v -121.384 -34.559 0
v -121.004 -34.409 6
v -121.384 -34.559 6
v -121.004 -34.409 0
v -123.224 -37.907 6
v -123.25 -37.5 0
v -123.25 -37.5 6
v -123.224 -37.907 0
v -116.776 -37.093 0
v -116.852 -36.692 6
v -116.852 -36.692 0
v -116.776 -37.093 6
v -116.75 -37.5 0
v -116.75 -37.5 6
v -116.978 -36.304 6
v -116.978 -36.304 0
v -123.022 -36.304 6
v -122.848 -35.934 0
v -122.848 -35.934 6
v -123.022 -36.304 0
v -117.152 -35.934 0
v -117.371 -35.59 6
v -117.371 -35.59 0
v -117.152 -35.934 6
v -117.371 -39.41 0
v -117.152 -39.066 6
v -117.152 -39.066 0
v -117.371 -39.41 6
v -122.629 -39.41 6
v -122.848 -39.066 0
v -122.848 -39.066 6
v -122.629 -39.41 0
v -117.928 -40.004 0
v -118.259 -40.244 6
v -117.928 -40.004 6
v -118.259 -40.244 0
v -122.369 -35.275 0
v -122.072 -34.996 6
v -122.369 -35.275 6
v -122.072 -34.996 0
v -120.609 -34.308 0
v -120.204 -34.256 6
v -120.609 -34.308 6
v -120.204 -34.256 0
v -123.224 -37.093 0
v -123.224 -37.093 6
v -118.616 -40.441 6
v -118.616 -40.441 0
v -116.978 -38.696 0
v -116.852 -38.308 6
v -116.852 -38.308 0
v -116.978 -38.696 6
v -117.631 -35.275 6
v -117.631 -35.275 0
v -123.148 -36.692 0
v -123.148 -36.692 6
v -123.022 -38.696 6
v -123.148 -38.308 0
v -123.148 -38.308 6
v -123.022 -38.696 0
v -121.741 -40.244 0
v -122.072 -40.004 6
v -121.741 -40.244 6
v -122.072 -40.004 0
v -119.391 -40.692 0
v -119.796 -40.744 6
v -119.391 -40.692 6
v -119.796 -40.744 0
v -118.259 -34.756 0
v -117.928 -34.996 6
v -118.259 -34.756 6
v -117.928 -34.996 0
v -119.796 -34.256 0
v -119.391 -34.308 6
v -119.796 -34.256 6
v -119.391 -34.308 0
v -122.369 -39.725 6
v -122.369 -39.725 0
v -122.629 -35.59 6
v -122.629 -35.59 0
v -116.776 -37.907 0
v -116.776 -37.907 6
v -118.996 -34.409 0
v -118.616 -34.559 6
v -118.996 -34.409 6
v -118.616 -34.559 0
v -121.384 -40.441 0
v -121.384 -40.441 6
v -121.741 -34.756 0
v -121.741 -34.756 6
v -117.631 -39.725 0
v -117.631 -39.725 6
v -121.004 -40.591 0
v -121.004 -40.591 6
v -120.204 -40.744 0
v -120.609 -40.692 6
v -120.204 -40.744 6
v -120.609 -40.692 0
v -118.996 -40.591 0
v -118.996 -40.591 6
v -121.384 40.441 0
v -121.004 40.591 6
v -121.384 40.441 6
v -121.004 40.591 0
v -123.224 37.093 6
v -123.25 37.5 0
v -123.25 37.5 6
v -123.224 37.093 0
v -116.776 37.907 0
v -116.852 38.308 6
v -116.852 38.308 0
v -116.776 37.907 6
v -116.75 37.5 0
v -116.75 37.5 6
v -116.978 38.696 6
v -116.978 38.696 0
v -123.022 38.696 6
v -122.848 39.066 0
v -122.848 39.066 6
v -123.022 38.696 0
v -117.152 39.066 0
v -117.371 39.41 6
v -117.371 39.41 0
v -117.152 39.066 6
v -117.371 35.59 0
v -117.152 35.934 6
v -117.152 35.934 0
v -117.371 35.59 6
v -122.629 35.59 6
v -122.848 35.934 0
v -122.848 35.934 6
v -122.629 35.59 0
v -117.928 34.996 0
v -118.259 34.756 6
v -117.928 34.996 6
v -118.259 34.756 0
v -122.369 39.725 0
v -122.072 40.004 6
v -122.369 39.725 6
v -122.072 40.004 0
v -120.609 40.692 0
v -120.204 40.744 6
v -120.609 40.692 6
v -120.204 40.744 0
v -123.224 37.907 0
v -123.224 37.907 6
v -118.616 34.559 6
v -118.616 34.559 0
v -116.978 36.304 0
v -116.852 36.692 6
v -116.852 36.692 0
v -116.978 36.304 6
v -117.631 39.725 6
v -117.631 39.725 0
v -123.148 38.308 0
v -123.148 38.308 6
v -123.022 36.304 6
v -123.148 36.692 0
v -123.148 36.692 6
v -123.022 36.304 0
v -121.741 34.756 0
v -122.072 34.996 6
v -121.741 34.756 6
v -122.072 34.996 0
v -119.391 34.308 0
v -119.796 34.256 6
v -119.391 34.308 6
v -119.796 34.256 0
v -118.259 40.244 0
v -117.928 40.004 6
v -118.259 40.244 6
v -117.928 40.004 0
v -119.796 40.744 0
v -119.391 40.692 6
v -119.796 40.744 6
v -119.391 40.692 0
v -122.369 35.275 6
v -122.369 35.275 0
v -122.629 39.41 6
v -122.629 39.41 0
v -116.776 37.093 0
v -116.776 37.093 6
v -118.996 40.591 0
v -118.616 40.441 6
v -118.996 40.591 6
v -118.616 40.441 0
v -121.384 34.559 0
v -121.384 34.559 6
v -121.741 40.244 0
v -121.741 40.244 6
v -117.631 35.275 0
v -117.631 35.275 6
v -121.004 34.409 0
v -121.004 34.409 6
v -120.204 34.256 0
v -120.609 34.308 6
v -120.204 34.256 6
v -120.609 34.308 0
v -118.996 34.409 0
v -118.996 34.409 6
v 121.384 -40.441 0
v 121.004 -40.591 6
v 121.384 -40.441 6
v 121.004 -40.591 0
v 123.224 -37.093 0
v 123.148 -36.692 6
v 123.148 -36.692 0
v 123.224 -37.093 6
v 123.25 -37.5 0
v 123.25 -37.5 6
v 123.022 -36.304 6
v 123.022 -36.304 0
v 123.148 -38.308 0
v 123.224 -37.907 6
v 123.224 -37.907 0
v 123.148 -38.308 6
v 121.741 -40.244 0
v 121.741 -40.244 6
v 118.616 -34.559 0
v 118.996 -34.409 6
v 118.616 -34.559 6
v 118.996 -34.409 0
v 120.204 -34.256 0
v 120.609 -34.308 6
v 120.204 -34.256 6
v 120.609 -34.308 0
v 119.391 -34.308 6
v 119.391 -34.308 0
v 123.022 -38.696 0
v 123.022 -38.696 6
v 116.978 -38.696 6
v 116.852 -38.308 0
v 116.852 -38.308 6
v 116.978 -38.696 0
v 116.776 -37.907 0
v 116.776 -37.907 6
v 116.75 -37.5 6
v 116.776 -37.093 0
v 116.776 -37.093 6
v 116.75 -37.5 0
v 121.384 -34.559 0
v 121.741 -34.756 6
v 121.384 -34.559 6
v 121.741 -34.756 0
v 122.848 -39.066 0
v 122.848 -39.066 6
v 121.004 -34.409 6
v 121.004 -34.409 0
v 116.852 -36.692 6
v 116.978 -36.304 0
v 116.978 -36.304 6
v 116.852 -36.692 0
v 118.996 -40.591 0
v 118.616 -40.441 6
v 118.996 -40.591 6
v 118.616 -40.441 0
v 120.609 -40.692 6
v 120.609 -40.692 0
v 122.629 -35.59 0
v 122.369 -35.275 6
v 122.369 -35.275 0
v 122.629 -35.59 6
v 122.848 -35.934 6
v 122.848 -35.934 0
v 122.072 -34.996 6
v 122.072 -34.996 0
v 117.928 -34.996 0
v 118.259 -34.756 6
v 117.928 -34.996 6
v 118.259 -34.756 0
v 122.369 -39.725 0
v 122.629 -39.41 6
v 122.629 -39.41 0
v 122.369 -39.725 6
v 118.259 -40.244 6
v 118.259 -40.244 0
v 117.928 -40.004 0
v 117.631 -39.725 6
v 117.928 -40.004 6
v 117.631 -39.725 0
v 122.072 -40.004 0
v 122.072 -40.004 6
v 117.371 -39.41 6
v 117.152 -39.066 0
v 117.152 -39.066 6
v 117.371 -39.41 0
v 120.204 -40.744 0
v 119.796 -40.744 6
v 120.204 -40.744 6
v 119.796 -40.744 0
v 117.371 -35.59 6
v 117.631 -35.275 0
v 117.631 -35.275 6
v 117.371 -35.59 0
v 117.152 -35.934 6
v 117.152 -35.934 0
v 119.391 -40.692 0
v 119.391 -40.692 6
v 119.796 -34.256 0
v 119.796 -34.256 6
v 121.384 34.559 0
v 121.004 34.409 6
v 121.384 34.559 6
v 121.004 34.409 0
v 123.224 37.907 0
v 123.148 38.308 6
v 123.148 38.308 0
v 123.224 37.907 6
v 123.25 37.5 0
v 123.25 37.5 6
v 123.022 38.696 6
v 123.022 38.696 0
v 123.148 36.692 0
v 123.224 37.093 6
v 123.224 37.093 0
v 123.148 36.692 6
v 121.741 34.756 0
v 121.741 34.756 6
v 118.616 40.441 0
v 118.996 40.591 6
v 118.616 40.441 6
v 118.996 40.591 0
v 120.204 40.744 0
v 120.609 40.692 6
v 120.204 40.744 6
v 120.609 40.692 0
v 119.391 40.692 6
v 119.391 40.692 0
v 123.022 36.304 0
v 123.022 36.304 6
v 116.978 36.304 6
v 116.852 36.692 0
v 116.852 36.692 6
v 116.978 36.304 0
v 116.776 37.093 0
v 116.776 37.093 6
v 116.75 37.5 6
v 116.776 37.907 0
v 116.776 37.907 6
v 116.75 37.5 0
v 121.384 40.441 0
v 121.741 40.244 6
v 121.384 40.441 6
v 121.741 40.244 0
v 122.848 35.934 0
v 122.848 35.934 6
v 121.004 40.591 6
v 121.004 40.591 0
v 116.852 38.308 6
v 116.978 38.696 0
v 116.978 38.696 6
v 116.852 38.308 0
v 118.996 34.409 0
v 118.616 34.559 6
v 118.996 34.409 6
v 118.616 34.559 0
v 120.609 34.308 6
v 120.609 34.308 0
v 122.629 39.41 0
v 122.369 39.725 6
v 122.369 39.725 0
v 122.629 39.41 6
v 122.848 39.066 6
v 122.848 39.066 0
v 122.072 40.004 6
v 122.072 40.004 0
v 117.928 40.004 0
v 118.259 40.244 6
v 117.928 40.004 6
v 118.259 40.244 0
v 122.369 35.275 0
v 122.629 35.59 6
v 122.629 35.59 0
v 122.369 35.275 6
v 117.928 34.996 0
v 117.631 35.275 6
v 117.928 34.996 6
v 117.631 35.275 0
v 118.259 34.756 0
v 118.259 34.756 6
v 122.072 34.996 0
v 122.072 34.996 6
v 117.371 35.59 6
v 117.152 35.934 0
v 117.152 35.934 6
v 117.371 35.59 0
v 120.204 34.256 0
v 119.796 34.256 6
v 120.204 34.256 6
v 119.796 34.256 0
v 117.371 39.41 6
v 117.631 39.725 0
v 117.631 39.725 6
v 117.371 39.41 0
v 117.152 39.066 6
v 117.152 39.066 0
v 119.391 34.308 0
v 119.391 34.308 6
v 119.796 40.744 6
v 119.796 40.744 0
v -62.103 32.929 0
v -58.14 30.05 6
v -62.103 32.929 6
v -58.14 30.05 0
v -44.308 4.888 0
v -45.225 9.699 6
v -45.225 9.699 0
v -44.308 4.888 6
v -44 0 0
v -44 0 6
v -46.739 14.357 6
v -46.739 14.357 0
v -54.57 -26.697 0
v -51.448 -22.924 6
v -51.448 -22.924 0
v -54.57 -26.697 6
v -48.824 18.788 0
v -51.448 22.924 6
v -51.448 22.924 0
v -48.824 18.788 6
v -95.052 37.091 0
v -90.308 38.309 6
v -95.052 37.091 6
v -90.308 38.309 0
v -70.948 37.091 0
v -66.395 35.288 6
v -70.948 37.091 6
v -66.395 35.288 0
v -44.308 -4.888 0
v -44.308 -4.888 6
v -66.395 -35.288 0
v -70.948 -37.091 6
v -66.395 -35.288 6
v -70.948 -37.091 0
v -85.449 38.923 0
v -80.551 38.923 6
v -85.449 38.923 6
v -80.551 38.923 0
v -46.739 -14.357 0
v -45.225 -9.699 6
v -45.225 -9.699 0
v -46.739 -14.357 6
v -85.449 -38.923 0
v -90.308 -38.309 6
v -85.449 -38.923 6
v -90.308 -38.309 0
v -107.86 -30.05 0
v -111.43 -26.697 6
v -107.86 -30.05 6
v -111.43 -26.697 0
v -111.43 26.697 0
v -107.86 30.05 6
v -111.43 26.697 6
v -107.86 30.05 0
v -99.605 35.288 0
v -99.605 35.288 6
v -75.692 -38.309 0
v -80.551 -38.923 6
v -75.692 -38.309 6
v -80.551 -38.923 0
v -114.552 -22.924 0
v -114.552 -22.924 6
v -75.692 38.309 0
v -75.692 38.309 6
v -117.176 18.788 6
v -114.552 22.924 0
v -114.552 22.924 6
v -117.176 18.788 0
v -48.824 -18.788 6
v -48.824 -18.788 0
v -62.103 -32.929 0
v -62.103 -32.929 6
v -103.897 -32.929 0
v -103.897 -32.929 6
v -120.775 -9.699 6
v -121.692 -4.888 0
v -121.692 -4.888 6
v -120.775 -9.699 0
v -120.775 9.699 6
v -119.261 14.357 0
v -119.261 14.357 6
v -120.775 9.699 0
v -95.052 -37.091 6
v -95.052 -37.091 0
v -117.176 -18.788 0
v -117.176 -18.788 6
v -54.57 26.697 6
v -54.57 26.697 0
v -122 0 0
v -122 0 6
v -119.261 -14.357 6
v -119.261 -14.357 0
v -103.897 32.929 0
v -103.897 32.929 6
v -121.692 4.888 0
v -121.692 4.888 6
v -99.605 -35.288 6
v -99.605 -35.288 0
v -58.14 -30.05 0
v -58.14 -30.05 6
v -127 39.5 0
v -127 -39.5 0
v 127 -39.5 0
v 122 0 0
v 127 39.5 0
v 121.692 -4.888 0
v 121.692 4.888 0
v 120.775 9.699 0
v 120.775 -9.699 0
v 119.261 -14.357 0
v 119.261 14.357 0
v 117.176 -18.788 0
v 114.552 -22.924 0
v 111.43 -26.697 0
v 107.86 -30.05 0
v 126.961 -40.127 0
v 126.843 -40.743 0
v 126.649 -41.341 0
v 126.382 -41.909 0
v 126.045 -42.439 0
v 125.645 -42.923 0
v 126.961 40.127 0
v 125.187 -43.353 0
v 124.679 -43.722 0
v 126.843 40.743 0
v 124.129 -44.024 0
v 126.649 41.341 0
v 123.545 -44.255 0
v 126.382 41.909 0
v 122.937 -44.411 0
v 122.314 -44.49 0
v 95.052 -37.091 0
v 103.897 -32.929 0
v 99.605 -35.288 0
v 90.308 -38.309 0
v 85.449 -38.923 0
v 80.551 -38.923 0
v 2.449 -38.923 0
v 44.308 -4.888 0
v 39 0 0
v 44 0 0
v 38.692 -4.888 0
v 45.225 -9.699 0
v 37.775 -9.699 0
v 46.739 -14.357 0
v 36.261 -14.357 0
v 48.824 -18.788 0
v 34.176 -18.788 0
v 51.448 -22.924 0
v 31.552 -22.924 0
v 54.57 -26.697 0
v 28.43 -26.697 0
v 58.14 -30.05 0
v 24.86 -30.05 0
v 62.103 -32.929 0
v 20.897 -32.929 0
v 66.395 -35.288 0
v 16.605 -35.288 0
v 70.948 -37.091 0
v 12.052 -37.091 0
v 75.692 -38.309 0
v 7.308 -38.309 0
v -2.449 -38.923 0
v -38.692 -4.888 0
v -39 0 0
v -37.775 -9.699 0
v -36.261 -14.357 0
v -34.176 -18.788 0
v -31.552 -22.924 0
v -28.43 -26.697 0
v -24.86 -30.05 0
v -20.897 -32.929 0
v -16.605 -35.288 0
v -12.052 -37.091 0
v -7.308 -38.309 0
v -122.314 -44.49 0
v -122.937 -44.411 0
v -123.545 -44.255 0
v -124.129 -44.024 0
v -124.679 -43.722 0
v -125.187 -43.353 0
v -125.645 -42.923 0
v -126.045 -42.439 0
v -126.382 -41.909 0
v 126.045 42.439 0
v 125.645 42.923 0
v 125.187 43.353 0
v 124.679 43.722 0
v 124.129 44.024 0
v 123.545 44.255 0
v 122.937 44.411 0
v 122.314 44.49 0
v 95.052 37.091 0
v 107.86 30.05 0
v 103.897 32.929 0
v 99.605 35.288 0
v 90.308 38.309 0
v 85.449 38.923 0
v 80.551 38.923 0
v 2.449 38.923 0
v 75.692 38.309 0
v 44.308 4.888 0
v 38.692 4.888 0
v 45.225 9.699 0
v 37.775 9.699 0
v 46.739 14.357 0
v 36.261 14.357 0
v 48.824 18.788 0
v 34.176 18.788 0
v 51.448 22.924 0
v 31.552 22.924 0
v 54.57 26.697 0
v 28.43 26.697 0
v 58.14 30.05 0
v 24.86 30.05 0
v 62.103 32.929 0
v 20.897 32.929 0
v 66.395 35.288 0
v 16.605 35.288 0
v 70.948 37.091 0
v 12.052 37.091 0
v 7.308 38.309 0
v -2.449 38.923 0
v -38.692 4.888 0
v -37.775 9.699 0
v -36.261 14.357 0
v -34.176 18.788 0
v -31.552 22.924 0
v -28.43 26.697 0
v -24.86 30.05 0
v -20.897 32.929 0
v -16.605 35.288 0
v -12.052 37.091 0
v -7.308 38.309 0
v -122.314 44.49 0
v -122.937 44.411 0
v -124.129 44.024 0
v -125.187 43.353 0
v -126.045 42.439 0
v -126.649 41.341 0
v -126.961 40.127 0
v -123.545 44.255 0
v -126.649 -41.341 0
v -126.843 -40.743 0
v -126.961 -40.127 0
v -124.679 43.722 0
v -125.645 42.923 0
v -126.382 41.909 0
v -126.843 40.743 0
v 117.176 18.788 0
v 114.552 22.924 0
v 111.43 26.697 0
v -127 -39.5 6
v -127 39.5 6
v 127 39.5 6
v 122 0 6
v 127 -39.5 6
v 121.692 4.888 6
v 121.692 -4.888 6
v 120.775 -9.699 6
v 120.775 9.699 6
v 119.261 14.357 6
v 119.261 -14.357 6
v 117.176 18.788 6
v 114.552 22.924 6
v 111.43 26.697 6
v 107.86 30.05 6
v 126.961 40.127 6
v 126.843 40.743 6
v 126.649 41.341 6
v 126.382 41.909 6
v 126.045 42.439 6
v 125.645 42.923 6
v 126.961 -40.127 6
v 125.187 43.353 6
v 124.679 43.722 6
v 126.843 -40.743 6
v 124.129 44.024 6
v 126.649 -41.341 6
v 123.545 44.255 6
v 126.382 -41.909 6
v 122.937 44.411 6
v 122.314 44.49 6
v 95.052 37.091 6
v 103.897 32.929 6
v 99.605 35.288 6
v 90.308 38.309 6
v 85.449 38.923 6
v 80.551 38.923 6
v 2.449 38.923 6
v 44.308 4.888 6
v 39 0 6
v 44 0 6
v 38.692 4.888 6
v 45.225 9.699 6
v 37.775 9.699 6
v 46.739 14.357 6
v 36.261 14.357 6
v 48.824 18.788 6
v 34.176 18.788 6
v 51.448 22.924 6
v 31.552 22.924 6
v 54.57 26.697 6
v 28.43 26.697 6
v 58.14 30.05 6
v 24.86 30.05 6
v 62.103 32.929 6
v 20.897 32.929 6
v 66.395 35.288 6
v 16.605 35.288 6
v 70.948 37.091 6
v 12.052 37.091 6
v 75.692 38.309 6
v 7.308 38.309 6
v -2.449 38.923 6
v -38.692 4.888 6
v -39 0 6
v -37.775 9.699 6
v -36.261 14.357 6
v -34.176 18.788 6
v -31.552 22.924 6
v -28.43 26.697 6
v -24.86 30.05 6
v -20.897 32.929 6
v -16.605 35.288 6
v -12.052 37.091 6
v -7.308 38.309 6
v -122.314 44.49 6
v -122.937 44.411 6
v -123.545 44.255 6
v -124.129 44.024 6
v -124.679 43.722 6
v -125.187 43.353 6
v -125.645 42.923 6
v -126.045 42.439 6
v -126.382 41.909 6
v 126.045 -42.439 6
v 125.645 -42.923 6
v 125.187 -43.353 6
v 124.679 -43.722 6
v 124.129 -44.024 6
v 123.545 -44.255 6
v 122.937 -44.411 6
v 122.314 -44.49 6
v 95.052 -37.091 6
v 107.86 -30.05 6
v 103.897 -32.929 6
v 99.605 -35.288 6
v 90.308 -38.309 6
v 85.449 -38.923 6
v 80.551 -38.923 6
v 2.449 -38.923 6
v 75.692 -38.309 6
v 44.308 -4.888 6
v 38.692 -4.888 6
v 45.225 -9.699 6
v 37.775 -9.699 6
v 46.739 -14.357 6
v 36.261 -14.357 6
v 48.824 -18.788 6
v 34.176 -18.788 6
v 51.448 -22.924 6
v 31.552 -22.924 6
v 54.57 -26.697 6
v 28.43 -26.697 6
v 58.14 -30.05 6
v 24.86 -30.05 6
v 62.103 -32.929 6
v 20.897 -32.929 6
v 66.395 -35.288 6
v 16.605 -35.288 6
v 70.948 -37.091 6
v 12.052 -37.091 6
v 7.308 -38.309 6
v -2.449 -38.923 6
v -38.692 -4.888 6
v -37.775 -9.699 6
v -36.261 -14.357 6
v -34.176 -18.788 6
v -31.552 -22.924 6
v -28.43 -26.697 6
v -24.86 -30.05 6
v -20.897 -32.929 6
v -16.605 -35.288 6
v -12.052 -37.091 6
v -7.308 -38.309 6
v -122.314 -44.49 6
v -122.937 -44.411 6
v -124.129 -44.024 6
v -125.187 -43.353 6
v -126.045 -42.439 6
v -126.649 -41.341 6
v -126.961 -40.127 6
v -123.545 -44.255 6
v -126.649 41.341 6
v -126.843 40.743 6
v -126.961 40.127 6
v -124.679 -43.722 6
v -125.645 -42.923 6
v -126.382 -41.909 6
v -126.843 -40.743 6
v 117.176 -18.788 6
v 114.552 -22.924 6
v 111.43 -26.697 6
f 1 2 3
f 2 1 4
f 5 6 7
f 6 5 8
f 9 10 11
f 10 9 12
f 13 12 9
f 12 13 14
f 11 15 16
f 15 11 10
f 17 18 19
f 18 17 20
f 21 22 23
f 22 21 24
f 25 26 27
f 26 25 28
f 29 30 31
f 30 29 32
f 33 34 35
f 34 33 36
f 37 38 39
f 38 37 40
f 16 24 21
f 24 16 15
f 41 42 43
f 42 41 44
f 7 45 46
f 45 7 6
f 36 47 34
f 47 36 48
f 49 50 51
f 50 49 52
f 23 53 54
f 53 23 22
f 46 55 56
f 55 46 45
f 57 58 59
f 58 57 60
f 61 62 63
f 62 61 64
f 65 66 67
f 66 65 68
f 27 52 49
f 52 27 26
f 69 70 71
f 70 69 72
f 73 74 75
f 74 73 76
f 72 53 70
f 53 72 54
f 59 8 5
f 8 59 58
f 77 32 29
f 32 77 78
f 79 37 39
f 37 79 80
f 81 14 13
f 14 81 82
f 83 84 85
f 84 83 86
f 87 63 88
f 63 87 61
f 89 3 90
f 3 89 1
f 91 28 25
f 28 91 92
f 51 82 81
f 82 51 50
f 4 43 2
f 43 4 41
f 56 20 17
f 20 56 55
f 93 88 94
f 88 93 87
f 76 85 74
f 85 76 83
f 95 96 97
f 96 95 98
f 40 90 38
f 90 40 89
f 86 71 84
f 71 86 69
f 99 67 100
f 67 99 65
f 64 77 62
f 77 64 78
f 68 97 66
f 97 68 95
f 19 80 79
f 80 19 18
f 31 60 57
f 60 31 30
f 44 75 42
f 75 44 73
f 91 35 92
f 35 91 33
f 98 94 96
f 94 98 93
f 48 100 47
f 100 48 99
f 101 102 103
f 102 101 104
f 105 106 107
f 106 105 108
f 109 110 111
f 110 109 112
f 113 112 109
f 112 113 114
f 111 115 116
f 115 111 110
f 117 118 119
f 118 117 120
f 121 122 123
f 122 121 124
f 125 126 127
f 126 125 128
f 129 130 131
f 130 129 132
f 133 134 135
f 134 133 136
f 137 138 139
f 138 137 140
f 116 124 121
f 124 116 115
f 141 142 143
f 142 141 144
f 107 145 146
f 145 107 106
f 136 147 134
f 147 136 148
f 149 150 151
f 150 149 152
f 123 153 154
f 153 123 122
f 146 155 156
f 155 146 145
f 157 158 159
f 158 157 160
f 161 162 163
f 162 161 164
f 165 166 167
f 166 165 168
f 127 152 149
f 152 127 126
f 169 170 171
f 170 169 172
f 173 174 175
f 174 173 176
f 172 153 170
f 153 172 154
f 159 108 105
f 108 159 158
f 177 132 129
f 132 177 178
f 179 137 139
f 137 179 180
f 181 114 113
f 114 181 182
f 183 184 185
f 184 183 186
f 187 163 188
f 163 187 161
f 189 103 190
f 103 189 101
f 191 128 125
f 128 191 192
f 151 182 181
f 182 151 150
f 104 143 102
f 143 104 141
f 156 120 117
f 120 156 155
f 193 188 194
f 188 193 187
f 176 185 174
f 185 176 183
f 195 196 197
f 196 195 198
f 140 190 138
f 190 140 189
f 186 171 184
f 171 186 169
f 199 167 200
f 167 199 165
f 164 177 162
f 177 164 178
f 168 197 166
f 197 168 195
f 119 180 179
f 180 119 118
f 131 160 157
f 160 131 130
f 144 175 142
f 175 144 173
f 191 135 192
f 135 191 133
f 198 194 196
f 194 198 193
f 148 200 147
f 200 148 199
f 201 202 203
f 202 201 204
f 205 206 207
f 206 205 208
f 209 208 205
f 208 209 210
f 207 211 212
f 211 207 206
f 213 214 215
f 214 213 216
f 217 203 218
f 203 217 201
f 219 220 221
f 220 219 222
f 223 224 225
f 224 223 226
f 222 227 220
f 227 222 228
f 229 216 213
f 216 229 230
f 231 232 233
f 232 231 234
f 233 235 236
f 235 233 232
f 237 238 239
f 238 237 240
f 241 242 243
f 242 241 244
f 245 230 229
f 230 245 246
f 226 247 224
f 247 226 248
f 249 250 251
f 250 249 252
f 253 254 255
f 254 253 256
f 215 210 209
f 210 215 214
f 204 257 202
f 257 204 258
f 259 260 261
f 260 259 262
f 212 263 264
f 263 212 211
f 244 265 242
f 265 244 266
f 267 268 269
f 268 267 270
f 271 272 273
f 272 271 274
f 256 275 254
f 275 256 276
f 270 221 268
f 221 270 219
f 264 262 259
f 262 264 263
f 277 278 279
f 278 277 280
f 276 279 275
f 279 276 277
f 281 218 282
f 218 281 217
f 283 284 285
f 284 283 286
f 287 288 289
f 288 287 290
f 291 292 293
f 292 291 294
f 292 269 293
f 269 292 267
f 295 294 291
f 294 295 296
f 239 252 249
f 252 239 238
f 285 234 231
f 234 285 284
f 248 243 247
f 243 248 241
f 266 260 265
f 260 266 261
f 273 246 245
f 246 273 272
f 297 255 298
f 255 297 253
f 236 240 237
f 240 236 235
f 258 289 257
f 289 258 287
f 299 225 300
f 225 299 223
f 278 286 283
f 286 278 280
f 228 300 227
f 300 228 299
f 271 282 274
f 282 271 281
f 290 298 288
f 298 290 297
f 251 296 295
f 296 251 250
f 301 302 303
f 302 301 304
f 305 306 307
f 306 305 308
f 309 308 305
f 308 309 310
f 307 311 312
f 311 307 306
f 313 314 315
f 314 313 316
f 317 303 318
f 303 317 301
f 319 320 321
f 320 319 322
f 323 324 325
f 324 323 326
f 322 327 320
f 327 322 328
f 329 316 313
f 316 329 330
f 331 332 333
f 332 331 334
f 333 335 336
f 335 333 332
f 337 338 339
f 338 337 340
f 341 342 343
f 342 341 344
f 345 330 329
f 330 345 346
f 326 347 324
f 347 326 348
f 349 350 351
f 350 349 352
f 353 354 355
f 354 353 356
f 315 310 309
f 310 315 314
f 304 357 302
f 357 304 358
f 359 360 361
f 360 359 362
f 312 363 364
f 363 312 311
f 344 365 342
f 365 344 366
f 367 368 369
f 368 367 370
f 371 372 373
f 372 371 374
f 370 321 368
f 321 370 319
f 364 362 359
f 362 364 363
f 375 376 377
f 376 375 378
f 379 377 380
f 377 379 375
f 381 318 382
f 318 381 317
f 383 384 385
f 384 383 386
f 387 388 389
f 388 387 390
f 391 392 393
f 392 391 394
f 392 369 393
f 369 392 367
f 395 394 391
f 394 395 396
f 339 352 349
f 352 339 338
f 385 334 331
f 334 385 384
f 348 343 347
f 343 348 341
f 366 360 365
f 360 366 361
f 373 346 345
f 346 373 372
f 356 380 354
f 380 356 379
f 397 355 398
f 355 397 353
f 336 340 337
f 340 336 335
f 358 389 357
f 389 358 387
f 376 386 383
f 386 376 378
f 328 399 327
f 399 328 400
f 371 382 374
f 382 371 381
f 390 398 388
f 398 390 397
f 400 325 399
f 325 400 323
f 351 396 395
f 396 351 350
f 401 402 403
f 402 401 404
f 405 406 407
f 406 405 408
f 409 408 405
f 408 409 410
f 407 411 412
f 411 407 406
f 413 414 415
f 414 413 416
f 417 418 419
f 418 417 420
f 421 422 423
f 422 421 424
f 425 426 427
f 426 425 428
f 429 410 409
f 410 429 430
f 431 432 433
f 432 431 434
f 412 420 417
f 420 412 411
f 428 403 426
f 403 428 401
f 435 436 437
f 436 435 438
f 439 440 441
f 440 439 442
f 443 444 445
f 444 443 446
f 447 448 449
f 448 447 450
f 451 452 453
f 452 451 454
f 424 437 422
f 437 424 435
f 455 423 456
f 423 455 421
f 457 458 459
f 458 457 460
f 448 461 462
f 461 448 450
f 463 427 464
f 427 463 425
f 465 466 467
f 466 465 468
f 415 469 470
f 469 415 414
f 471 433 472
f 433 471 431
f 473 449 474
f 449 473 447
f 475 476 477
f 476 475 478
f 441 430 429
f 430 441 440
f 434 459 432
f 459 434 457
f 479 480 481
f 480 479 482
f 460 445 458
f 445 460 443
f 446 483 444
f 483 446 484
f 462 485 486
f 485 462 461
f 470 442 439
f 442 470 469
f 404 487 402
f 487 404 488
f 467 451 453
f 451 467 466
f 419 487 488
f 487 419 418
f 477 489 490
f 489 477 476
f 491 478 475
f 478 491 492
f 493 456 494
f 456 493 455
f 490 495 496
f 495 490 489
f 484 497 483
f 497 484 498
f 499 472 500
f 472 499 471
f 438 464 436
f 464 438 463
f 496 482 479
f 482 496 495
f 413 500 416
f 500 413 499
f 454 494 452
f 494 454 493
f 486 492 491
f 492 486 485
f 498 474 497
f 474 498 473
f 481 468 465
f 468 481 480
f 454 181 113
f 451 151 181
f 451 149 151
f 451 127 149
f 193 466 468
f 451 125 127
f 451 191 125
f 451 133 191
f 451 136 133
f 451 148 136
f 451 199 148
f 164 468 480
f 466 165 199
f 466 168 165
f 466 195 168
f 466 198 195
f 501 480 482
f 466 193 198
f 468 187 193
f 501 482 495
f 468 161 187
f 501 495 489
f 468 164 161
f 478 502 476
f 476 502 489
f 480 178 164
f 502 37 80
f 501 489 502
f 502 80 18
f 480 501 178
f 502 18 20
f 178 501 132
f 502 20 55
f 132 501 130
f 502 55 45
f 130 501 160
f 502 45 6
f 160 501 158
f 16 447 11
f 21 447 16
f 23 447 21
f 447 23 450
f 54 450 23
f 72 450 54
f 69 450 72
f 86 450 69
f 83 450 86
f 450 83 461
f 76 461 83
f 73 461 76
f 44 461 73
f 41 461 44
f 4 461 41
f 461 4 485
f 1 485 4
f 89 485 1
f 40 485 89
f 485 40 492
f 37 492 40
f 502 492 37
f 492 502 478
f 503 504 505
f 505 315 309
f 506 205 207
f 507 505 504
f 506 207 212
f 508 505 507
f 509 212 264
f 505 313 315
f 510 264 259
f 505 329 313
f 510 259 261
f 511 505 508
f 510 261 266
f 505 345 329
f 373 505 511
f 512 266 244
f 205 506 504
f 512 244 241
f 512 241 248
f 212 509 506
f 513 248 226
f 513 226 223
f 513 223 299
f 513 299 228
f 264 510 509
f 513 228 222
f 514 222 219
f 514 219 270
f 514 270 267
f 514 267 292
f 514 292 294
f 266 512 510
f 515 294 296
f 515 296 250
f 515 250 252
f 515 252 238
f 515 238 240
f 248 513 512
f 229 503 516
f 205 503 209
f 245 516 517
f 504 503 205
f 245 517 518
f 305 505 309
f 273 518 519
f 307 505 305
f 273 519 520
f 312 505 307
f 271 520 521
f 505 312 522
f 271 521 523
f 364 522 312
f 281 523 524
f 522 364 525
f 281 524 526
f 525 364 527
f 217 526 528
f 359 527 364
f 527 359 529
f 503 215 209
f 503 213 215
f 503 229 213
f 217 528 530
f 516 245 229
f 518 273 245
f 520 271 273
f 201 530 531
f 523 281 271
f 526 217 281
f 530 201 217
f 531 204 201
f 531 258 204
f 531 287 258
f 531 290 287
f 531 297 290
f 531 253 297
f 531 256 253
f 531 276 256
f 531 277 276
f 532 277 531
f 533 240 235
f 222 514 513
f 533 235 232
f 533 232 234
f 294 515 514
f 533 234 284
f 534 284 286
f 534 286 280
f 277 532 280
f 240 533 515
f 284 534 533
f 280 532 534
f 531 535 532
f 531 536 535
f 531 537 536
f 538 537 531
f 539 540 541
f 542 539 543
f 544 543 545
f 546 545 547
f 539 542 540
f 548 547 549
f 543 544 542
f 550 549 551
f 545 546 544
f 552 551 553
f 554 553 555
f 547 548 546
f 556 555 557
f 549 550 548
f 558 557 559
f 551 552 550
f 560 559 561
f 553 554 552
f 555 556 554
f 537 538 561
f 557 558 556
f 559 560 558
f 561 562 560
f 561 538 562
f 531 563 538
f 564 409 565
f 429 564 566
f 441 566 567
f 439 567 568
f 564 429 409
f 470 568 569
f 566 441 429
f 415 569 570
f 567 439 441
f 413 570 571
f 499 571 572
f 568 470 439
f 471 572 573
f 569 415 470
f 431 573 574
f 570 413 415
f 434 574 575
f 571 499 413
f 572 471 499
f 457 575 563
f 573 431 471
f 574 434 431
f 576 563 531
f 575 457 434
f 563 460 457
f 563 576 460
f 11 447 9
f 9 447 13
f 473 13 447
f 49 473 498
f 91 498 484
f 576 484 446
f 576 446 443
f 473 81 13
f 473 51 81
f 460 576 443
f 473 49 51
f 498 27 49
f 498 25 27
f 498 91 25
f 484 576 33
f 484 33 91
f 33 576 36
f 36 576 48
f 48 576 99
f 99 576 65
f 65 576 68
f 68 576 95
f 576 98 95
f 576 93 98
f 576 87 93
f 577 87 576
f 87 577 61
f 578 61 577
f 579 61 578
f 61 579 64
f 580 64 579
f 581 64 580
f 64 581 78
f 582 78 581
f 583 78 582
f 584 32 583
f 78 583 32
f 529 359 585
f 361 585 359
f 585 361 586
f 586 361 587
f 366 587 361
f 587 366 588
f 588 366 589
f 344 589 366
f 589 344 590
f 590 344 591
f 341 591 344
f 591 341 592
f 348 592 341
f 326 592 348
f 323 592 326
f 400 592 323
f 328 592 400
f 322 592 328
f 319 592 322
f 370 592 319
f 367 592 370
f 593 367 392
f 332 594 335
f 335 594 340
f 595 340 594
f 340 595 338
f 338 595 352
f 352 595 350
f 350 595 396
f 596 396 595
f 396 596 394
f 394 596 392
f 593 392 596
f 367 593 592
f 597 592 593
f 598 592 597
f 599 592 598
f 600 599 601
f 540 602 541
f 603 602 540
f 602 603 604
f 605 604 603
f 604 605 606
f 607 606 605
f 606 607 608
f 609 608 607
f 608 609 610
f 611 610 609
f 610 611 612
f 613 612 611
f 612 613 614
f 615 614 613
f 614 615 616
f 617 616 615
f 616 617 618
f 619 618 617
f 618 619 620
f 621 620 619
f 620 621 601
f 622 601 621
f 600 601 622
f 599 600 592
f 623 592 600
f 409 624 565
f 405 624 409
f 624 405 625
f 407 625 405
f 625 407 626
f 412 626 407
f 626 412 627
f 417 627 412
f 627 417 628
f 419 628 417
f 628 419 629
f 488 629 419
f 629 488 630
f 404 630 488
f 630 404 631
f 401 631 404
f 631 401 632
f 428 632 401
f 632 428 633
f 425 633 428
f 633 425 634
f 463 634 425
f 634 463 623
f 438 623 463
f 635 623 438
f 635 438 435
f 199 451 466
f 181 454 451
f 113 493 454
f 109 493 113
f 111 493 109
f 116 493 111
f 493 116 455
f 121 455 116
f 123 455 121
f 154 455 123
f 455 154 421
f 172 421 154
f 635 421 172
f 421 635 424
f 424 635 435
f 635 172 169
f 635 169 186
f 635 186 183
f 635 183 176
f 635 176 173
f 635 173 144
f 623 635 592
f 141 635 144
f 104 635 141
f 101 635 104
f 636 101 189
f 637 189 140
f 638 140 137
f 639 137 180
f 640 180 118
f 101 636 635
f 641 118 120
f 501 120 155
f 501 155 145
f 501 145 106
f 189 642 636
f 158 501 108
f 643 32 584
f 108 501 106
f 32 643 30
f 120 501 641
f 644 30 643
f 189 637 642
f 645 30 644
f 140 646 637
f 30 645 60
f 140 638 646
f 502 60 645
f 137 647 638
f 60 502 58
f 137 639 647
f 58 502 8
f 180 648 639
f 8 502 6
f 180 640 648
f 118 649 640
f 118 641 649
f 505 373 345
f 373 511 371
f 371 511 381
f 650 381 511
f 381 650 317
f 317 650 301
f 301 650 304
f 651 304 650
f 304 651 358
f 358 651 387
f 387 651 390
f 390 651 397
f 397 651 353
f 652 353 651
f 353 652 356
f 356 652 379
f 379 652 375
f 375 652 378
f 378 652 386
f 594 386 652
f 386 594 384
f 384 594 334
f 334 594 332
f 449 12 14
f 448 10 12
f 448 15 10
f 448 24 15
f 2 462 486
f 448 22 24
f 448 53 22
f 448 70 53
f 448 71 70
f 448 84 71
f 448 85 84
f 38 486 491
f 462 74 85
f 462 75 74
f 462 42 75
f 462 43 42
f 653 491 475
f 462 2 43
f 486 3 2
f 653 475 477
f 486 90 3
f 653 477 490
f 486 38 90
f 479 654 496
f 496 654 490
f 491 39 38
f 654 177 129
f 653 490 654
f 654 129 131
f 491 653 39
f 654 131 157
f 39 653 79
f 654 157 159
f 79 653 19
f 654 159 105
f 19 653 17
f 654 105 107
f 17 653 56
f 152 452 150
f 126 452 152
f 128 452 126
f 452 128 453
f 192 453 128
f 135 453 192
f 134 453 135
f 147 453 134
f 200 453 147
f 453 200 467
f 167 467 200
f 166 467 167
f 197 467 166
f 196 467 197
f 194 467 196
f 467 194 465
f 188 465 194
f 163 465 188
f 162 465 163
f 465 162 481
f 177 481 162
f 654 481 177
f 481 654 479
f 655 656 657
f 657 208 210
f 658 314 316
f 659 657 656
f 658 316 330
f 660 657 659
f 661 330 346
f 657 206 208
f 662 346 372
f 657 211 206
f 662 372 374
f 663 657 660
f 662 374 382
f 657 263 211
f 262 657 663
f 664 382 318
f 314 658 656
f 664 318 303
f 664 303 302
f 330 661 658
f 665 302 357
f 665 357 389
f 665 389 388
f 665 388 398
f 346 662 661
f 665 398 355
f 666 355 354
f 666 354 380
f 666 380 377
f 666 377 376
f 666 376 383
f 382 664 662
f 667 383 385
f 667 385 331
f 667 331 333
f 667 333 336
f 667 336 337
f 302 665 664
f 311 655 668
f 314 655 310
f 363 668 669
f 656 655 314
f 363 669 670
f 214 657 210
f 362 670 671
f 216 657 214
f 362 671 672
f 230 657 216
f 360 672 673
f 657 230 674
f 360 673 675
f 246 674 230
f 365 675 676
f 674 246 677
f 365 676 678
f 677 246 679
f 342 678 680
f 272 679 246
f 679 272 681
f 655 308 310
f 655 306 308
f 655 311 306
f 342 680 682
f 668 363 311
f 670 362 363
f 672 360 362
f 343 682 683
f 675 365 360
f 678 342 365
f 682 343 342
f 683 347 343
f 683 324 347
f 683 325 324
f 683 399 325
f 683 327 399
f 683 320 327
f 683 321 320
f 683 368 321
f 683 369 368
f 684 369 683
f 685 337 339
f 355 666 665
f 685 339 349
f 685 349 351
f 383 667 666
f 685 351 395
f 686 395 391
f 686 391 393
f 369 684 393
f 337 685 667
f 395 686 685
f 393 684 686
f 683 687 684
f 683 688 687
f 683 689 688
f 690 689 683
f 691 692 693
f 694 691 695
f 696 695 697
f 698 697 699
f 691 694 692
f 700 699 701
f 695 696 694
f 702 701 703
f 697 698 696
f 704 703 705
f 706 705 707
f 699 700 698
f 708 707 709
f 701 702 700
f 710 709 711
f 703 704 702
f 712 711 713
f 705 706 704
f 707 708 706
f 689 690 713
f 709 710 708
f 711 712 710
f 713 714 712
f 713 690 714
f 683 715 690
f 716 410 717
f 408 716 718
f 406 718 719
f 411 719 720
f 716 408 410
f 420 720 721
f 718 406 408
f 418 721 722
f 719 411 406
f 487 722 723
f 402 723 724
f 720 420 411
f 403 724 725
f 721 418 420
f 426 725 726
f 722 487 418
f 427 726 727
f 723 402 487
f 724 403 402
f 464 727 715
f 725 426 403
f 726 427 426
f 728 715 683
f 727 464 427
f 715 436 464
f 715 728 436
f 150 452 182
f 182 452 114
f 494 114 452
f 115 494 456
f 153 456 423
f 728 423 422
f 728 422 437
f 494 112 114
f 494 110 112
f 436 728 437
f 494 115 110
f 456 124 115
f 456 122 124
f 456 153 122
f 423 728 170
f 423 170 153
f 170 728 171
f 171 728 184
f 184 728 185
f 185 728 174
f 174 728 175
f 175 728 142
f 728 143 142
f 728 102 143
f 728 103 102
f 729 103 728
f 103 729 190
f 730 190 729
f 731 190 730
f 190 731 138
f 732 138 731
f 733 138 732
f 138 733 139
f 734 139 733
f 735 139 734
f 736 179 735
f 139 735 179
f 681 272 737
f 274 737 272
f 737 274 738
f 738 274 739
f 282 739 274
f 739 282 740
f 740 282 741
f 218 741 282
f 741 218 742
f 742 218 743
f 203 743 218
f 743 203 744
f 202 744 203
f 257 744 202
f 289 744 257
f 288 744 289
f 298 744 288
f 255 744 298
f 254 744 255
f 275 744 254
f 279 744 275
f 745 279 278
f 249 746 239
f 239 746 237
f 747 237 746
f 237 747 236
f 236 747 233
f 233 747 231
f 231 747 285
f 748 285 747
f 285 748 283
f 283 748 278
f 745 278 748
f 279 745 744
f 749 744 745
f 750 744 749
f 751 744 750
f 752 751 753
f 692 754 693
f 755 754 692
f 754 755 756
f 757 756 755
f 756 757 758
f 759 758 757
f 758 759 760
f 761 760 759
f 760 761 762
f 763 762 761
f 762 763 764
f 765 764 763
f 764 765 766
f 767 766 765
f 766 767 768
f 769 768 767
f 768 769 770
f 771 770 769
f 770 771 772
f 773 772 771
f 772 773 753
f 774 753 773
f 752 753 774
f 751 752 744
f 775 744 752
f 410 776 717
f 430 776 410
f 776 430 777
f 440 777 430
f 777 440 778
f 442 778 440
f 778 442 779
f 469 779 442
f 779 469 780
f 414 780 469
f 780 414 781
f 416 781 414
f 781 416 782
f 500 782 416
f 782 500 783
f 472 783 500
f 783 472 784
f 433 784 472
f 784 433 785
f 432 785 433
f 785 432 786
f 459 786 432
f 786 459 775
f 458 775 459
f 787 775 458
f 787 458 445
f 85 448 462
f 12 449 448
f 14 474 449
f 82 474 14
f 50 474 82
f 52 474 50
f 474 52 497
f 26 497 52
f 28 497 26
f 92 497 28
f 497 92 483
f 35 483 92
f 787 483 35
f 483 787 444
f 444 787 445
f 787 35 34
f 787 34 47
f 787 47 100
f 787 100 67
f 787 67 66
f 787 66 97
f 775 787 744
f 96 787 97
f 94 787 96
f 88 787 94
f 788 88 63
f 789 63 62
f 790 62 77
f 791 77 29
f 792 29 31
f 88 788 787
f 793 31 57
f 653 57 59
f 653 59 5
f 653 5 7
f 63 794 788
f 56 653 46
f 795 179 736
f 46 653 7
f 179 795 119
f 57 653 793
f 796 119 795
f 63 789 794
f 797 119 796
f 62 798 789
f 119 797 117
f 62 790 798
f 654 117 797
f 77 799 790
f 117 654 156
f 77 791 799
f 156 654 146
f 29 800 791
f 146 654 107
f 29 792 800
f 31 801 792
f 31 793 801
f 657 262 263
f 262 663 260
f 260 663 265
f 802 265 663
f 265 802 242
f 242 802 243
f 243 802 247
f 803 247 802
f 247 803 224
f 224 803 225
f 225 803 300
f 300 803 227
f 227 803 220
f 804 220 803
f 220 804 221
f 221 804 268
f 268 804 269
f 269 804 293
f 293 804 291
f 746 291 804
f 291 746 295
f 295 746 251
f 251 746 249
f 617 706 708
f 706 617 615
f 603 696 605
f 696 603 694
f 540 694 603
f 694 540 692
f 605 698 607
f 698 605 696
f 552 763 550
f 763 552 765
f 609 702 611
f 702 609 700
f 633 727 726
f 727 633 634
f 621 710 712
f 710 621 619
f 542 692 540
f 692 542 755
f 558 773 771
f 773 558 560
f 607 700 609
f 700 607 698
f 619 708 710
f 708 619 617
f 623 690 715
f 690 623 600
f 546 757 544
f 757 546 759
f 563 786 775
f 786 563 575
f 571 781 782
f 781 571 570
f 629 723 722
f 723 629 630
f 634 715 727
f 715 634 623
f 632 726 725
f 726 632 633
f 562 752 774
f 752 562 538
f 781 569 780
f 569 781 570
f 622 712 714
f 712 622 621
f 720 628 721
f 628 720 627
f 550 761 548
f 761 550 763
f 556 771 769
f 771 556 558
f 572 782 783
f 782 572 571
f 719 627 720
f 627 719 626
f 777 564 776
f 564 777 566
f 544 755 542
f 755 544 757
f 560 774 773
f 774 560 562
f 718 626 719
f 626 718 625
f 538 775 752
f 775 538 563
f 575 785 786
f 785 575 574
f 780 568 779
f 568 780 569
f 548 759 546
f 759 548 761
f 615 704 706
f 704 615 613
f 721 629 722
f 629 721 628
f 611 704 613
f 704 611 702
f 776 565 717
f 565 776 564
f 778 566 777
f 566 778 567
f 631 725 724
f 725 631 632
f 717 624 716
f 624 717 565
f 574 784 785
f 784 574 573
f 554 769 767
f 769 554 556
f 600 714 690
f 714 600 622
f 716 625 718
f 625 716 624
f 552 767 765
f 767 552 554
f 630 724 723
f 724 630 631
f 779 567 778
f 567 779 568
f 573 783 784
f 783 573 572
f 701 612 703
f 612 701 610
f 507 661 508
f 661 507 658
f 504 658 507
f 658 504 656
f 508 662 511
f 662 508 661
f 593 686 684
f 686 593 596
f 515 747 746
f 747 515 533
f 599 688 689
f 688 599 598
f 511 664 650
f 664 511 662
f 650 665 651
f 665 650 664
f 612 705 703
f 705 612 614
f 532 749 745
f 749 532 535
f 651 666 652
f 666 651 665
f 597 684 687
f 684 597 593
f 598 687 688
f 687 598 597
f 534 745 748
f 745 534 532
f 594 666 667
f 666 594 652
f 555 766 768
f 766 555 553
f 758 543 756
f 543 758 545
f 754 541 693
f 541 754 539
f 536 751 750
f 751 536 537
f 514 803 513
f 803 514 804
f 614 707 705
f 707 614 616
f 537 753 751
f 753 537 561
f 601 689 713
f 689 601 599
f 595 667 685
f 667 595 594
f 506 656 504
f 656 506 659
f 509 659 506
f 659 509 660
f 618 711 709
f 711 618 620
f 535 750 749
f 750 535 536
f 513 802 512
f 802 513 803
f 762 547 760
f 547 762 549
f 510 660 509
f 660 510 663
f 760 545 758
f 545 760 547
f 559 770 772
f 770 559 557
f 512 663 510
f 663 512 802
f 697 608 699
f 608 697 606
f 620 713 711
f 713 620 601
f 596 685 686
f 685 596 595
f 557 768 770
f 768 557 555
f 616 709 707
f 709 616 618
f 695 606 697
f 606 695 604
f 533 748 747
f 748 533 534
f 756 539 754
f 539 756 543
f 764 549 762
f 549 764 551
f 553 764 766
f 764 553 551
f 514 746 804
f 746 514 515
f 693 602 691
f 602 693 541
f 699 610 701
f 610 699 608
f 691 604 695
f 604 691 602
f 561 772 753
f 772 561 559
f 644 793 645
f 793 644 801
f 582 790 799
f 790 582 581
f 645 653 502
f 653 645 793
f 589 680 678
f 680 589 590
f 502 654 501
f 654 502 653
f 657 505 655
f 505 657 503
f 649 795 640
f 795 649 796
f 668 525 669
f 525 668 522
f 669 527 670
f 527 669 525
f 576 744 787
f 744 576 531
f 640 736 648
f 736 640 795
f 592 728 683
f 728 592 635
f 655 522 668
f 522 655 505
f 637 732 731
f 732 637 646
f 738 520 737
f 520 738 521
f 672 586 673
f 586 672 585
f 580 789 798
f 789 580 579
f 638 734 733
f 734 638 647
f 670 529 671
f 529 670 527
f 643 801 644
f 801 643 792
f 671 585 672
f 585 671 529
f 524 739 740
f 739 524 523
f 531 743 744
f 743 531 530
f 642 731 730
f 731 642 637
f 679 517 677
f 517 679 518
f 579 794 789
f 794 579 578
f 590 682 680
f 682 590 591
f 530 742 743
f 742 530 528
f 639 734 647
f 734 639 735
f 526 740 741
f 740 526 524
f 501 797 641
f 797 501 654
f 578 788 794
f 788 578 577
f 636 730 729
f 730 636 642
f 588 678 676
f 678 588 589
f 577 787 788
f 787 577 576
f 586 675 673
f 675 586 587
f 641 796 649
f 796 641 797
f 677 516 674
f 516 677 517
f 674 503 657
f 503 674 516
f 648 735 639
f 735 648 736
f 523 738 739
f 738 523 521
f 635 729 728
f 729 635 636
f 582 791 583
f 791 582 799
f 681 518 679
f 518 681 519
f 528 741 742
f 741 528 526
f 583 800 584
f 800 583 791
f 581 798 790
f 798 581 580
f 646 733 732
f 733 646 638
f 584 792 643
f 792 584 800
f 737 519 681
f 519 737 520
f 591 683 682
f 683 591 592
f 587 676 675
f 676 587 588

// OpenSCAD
$fn = 50;


difference() {
	union() {
		hull() {
			translate(v = [-122.0000000000, 39.5000000000, 0]) {
				cylinder(h = 6, r = 5);
			}
			translate(v = [122.0000000000, 39.5000000000, 0]) {
				cylinder(h = 6, r = 5);
			}
			translate(v = [-122.0000000000, -39.5000000000, 0]) {
				cylinder(h = 6, r = 5);
			}
			translate(v = [122.0000000000, -39.5000000000, 0]) {
				cylinder(h = 6, r = 5);
			}
		}
	}
	union() {
		#translate(v = [-120.0000000000, -37.5000000000, -100.0000000000]) {
			cylinder(h = 200, r = 3.2500000000);
		}
		#translate(v = [-120.0000000000, 37.5000000000, -100.0000000000]) {
			cylinder(h = 200, r = 3.2500000000);
		}
		#translate(v = [120.0000000000, -37.5000000000, -100.0000000000]) {
			cylinder(h = 200, r = 3.2500000000);
		}
		#translate(v = [120.0000000000, 37.5000000000, -100.0000000000]) {
			cylinder(h = 200, r = 3.2500000000);
		}
		#translate(v = [-83.0000000000, 0, 0]) {
			cylinder(h = 6, r = 39.0000000000);
		}
		#cylinder(h = 6, r = 39.0000000000);
		#translate(v = [83.0000000000, 0, 0]) {
			cylinder(h = 6, r = 39.0000000000);
		}
	}
}
